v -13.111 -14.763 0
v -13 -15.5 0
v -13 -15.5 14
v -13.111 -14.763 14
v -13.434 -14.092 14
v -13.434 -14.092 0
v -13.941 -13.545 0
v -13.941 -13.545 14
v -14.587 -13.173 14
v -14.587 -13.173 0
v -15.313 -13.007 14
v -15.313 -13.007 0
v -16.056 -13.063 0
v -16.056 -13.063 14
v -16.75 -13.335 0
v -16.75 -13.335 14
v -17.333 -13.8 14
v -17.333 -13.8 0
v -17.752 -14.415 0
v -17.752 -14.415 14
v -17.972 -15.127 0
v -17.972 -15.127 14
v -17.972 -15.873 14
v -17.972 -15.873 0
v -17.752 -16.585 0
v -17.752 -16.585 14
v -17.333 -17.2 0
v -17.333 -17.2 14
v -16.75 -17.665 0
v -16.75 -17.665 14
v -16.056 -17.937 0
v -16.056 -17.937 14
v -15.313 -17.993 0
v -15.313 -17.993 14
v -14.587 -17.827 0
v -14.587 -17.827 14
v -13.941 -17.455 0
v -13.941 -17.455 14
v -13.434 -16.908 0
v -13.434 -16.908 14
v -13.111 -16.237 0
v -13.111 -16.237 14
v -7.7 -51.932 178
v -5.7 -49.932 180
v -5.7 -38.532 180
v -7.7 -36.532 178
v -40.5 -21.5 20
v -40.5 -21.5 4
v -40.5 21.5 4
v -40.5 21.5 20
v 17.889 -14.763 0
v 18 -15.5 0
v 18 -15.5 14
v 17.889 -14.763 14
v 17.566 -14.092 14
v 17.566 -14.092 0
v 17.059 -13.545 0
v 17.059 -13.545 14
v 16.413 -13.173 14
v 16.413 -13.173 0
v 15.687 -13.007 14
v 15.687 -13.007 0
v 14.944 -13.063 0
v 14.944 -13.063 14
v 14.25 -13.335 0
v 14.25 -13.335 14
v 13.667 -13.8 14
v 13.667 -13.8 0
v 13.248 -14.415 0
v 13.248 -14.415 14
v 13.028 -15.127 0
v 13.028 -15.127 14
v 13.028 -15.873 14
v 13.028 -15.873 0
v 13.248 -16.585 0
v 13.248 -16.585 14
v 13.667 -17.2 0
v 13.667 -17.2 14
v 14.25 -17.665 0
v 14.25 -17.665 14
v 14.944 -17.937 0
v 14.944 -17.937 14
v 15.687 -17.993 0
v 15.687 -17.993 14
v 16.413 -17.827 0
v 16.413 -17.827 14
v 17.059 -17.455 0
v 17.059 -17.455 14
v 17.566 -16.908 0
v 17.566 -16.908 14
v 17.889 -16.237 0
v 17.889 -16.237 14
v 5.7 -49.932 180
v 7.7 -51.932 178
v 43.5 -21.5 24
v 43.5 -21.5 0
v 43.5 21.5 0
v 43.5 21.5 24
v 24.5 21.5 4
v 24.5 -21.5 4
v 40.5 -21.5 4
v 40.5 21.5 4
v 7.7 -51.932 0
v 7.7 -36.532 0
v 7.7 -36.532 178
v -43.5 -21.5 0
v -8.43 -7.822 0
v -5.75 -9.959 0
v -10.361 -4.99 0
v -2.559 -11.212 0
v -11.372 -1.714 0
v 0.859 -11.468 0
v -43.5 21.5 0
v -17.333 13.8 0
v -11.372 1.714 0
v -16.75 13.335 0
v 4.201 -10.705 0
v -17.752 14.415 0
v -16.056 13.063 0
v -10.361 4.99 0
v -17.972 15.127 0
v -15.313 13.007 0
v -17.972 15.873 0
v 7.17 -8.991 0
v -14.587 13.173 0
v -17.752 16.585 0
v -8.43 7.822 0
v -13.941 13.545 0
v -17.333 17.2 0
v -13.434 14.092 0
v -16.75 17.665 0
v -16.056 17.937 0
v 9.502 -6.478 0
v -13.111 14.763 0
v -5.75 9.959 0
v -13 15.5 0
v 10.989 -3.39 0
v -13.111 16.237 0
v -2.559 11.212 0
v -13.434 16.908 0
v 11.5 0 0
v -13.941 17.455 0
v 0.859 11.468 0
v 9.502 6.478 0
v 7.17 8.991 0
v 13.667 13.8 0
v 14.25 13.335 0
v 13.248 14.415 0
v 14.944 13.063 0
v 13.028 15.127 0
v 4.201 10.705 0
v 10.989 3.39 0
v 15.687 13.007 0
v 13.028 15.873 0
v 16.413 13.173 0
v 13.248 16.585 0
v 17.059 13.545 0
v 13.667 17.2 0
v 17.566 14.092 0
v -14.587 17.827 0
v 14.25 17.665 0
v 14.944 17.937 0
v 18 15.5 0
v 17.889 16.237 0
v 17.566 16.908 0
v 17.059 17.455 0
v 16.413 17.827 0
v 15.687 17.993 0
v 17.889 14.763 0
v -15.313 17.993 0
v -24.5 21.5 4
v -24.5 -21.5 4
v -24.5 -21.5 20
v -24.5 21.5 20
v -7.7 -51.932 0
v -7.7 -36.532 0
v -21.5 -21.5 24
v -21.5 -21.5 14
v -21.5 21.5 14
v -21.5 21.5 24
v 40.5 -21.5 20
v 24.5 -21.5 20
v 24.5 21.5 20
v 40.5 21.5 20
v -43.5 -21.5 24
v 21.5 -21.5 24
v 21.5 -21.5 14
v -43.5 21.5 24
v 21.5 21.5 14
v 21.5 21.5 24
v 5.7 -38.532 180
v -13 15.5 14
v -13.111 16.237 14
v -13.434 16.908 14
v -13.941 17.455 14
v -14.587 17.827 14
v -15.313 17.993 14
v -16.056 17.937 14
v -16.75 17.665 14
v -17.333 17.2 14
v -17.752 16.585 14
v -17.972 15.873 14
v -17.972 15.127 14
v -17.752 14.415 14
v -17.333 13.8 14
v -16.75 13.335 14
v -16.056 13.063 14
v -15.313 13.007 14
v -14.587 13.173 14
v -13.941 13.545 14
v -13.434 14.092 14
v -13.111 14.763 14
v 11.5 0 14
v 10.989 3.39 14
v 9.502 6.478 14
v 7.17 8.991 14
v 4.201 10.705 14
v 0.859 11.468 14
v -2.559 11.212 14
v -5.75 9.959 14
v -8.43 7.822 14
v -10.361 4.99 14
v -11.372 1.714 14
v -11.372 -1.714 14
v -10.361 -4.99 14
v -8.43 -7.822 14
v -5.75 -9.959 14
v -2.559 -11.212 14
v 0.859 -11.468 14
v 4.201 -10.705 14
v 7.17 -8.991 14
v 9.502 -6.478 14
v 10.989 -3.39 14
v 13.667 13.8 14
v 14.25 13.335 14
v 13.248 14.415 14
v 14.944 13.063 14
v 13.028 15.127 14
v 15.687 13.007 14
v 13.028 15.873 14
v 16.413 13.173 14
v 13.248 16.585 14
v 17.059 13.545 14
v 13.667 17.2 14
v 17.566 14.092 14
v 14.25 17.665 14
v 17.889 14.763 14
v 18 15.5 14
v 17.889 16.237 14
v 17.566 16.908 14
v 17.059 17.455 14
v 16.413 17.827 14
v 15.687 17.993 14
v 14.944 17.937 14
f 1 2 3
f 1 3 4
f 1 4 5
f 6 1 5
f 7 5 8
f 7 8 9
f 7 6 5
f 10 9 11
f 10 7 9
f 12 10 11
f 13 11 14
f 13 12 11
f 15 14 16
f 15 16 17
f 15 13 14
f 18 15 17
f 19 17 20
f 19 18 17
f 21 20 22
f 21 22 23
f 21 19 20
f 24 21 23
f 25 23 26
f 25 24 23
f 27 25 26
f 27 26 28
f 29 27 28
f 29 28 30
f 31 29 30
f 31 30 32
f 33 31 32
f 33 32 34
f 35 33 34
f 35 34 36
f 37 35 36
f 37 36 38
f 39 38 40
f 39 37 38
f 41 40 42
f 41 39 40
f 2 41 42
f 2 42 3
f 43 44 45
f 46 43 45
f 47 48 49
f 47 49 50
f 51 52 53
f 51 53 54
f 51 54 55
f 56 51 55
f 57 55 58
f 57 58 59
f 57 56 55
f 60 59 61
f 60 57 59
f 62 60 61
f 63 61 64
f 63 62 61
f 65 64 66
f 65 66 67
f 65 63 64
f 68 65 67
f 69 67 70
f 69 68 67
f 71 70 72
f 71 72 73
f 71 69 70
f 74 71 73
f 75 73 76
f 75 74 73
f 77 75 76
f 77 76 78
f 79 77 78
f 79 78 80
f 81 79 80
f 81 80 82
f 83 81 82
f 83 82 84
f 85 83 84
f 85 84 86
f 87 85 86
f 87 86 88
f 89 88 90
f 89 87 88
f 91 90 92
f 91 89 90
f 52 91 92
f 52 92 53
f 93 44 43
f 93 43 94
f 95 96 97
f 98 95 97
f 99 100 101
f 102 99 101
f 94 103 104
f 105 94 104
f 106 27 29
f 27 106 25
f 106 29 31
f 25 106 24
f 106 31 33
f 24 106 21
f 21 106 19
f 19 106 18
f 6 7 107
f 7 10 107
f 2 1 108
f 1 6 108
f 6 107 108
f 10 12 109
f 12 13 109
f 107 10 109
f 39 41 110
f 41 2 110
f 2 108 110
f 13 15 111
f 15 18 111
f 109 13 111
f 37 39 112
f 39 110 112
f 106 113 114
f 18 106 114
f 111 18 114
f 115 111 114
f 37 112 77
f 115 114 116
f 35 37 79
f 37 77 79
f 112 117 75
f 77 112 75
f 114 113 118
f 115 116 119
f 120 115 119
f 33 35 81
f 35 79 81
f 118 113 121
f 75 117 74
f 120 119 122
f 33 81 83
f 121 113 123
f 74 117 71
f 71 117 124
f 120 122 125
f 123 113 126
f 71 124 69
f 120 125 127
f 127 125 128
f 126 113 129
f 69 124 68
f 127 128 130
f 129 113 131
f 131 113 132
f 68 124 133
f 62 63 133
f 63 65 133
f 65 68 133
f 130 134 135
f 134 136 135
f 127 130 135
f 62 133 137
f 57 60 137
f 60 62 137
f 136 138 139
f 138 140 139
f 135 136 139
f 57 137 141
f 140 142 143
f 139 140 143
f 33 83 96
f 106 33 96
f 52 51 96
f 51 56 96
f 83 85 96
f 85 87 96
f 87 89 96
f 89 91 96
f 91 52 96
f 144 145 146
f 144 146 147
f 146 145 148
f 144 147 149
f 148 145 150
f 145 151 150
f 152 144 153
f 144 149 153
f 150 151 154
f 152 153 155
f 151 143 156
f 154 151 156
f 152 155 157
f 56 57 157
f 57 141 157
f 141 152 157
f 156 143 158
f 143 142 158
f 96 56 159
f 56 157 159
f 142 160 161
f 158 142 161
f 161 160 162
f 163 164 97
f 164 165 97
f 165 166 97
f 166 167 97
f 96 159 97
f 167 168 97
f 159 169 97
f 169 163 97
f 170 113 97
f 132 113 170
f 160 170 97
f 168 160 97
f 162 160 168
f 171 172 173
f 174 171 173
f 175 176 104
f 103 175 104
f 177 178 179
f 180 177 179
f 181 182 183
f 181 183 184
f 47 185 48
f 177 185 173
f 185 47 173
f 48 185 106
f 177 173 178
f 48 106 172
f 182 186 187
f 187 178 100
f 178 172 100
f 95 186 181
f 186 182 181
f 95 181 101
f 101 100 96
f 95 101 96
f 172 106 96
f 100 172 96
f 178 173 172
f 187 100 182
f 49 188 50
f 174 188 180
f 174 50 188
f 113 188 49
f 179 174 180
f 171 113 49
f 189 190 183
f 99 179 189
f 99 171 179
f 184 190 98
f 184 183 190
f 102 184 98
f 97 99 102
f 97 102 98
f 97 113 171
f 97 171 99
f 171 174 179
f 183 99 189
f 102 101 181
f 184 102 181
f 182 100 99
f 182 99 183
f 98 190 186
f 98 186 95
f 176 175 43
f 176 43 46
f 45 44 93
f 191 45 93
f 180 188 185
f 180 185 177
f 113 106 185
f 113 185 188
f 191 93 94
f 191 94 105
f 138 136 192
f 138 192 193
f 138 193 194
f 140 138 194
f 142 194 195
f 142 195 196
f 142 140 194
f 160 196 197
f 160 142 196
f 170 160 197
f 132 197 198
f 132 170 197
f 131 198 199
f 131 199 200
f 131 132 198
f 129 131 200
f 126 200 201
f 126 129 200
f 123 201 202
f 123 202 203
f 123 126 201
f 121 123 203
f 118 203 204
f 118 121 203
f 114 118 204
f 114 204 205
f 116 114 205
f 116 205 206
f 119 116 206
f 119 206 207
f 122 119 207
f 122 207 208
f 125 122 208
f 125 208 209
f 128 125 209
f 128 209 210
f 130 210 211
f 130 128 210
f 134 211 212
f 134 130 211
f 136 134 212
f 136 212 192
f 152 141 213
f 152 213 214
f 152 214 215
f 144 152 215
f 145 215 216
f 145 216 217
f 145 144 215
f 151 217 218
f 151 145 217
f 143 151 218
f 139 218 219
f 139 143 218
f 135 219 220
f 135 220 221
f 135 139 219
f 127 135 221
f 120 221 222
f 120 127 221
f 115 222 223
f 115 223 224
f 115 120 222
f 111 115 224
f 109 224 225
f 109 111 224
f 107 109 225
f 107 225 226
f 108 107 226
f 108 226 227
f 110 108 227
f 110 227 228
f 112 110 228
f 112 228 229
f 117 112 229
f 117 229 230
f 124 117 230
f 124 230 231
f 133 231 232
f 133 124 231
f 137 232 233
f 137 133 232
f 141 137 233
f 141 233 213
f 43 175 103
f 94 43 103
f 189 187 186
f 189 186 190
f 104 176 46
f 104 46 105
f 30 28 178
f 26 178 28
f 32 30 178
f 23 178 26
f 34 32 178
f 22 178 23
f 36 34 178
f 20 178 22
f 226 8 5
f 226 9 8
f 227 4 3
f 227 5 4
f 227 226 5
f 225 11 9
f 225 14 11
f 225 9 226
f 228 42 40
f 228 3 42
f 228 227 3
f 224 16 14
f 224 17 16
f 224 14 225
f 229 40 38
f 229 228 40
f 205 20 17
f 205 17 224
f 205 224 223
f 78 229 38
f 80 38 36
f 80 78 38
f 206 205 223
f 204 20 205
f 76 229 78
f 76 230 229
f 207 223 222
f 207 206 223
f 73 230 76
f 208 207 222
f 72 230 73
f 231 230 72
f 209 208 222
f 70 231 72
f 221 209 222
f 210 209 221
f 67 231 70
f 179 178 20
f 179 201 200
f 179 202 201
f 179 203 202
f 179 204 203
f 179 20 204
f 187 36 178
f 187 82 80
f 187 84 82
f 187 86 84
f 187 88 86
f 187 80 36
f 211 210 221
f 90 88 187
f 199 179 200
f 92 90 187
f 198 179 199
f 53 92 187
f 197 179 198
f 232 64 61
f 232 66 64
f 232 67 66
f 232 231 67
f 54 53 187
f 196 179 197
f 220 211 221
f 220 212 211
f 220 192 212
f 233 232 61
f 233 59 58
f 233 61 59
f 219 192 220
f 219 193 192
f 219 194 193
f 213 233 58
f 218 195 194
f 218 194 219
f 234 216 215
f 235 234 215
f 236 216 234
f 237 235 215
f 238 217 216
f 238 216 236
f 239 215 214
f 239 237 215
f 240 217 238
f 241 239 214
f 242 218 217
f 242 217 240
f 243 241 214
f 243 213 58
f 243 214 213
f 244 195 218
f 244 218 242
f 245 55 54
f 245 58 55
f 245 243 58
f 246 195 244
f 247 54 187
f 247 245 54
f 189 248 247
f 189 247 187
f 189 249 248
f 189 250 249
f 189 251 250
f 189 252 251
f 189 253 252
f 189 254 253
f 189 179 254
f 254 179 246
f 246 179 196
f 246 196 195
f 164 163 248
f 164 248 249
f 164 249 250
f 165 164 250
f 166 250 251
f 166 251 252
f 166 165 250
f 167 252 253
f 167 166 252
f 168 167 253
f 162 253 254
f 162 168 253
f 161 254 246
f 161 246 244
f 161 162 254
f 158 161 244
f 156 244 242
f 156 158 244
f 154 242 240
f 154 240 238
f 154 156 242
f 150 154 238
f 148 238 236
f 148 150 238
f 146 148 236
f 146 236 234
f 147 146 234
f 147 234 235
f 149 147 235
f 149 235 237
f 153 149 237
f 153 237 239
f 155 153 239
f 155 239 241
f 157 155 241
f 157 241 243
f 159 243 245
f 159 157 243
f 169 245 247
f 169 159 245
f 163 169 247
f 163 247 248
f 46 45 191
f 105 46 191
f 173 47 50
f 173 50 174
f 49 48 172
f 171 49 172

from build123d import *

# Parameters (mm, degrees)
F0_W     = 43
F0_H     = 43
F0_R     = 2.5
F0_R_2   = 11.5
F1_DEPTH = 14
F0_W_2   = 22
F2_DEPTH = 24
F3_W     = 16
F3_H     = 16
F4_DEPTH = 43
F0_W_3   = 15.4
F0_H_2   = 15.4
F5_DEPTH = 180
F6_SIZE  = 2


with BuildPart() as f1:
    # F0 (on Top) → F1 (new body)
    with BuildSketch(Plane.XY):
        Rectangle(F0_W, F0_H)
        with Locations((-15.5, -15.5)):
            Circle(F0_R, mode=Mode.SUBTRACT)
        with Locations((15.5, -15.5)):
            Circle(F0_R, mode=Mode.SUBTRACT)
        with Locations((-15.5, 15.5)):
            Circle(F0_R, mode=Mode.SUBTRACT)
        Circle(F0_R_2, mode=Mode.SUBTRACT)
        with Locations((15.5, 15.5)):
            Circle(F0_R, mode=Mode.SUBTRACT)
    extrude(amount=F1_DEPTH)

    # F0 (on Top) → F2 (join)
    with BuildSketch(Plane.XY):
        with Locations((-32.5, 0)):
            Rectangle(F0_W_2, F0_H)
        with Locations((32.5, 0)):
            Rectangle(F0_W_2, F0_H)
    extrude(amount=F2_DEPTH)

    # F3 (on face) → F4 (cut, through all)
    with BuildSketch(Plane.XZ.offset(21.5)):
        with Locations((-32.5, 12)):
            Rectangle(F3_W, F3_H)
        with Locations((32.5, 12)):
            Rectangle(F3_W, F3_H)
    extrude(amount=-F4_DEPTH, mode=Mode.SUBTRACT)


with BuildPart() as f5:
    # F0 (on Top) → F5 (new body)
    with BuildSketch(Plane.XY):
        with Locations((0, -44.232037)):
            Rectangle(F0_W_3, F0_H_2)
    extrude(amount=F5_DEPTH)

    # F6
    f6_edges = [f5.edges().sort_by_distance(p)[0] for p in [
        (0, -51.932037, 180),
        (7.7, -44.232037, 180),
        (-7.7, -44.232037, 180),
        (0, -36.532037, 180),
    ]]
    chamfer(f6_edges, length=F6_SIZE)


solid = Compound([f1.part, f5.part])
